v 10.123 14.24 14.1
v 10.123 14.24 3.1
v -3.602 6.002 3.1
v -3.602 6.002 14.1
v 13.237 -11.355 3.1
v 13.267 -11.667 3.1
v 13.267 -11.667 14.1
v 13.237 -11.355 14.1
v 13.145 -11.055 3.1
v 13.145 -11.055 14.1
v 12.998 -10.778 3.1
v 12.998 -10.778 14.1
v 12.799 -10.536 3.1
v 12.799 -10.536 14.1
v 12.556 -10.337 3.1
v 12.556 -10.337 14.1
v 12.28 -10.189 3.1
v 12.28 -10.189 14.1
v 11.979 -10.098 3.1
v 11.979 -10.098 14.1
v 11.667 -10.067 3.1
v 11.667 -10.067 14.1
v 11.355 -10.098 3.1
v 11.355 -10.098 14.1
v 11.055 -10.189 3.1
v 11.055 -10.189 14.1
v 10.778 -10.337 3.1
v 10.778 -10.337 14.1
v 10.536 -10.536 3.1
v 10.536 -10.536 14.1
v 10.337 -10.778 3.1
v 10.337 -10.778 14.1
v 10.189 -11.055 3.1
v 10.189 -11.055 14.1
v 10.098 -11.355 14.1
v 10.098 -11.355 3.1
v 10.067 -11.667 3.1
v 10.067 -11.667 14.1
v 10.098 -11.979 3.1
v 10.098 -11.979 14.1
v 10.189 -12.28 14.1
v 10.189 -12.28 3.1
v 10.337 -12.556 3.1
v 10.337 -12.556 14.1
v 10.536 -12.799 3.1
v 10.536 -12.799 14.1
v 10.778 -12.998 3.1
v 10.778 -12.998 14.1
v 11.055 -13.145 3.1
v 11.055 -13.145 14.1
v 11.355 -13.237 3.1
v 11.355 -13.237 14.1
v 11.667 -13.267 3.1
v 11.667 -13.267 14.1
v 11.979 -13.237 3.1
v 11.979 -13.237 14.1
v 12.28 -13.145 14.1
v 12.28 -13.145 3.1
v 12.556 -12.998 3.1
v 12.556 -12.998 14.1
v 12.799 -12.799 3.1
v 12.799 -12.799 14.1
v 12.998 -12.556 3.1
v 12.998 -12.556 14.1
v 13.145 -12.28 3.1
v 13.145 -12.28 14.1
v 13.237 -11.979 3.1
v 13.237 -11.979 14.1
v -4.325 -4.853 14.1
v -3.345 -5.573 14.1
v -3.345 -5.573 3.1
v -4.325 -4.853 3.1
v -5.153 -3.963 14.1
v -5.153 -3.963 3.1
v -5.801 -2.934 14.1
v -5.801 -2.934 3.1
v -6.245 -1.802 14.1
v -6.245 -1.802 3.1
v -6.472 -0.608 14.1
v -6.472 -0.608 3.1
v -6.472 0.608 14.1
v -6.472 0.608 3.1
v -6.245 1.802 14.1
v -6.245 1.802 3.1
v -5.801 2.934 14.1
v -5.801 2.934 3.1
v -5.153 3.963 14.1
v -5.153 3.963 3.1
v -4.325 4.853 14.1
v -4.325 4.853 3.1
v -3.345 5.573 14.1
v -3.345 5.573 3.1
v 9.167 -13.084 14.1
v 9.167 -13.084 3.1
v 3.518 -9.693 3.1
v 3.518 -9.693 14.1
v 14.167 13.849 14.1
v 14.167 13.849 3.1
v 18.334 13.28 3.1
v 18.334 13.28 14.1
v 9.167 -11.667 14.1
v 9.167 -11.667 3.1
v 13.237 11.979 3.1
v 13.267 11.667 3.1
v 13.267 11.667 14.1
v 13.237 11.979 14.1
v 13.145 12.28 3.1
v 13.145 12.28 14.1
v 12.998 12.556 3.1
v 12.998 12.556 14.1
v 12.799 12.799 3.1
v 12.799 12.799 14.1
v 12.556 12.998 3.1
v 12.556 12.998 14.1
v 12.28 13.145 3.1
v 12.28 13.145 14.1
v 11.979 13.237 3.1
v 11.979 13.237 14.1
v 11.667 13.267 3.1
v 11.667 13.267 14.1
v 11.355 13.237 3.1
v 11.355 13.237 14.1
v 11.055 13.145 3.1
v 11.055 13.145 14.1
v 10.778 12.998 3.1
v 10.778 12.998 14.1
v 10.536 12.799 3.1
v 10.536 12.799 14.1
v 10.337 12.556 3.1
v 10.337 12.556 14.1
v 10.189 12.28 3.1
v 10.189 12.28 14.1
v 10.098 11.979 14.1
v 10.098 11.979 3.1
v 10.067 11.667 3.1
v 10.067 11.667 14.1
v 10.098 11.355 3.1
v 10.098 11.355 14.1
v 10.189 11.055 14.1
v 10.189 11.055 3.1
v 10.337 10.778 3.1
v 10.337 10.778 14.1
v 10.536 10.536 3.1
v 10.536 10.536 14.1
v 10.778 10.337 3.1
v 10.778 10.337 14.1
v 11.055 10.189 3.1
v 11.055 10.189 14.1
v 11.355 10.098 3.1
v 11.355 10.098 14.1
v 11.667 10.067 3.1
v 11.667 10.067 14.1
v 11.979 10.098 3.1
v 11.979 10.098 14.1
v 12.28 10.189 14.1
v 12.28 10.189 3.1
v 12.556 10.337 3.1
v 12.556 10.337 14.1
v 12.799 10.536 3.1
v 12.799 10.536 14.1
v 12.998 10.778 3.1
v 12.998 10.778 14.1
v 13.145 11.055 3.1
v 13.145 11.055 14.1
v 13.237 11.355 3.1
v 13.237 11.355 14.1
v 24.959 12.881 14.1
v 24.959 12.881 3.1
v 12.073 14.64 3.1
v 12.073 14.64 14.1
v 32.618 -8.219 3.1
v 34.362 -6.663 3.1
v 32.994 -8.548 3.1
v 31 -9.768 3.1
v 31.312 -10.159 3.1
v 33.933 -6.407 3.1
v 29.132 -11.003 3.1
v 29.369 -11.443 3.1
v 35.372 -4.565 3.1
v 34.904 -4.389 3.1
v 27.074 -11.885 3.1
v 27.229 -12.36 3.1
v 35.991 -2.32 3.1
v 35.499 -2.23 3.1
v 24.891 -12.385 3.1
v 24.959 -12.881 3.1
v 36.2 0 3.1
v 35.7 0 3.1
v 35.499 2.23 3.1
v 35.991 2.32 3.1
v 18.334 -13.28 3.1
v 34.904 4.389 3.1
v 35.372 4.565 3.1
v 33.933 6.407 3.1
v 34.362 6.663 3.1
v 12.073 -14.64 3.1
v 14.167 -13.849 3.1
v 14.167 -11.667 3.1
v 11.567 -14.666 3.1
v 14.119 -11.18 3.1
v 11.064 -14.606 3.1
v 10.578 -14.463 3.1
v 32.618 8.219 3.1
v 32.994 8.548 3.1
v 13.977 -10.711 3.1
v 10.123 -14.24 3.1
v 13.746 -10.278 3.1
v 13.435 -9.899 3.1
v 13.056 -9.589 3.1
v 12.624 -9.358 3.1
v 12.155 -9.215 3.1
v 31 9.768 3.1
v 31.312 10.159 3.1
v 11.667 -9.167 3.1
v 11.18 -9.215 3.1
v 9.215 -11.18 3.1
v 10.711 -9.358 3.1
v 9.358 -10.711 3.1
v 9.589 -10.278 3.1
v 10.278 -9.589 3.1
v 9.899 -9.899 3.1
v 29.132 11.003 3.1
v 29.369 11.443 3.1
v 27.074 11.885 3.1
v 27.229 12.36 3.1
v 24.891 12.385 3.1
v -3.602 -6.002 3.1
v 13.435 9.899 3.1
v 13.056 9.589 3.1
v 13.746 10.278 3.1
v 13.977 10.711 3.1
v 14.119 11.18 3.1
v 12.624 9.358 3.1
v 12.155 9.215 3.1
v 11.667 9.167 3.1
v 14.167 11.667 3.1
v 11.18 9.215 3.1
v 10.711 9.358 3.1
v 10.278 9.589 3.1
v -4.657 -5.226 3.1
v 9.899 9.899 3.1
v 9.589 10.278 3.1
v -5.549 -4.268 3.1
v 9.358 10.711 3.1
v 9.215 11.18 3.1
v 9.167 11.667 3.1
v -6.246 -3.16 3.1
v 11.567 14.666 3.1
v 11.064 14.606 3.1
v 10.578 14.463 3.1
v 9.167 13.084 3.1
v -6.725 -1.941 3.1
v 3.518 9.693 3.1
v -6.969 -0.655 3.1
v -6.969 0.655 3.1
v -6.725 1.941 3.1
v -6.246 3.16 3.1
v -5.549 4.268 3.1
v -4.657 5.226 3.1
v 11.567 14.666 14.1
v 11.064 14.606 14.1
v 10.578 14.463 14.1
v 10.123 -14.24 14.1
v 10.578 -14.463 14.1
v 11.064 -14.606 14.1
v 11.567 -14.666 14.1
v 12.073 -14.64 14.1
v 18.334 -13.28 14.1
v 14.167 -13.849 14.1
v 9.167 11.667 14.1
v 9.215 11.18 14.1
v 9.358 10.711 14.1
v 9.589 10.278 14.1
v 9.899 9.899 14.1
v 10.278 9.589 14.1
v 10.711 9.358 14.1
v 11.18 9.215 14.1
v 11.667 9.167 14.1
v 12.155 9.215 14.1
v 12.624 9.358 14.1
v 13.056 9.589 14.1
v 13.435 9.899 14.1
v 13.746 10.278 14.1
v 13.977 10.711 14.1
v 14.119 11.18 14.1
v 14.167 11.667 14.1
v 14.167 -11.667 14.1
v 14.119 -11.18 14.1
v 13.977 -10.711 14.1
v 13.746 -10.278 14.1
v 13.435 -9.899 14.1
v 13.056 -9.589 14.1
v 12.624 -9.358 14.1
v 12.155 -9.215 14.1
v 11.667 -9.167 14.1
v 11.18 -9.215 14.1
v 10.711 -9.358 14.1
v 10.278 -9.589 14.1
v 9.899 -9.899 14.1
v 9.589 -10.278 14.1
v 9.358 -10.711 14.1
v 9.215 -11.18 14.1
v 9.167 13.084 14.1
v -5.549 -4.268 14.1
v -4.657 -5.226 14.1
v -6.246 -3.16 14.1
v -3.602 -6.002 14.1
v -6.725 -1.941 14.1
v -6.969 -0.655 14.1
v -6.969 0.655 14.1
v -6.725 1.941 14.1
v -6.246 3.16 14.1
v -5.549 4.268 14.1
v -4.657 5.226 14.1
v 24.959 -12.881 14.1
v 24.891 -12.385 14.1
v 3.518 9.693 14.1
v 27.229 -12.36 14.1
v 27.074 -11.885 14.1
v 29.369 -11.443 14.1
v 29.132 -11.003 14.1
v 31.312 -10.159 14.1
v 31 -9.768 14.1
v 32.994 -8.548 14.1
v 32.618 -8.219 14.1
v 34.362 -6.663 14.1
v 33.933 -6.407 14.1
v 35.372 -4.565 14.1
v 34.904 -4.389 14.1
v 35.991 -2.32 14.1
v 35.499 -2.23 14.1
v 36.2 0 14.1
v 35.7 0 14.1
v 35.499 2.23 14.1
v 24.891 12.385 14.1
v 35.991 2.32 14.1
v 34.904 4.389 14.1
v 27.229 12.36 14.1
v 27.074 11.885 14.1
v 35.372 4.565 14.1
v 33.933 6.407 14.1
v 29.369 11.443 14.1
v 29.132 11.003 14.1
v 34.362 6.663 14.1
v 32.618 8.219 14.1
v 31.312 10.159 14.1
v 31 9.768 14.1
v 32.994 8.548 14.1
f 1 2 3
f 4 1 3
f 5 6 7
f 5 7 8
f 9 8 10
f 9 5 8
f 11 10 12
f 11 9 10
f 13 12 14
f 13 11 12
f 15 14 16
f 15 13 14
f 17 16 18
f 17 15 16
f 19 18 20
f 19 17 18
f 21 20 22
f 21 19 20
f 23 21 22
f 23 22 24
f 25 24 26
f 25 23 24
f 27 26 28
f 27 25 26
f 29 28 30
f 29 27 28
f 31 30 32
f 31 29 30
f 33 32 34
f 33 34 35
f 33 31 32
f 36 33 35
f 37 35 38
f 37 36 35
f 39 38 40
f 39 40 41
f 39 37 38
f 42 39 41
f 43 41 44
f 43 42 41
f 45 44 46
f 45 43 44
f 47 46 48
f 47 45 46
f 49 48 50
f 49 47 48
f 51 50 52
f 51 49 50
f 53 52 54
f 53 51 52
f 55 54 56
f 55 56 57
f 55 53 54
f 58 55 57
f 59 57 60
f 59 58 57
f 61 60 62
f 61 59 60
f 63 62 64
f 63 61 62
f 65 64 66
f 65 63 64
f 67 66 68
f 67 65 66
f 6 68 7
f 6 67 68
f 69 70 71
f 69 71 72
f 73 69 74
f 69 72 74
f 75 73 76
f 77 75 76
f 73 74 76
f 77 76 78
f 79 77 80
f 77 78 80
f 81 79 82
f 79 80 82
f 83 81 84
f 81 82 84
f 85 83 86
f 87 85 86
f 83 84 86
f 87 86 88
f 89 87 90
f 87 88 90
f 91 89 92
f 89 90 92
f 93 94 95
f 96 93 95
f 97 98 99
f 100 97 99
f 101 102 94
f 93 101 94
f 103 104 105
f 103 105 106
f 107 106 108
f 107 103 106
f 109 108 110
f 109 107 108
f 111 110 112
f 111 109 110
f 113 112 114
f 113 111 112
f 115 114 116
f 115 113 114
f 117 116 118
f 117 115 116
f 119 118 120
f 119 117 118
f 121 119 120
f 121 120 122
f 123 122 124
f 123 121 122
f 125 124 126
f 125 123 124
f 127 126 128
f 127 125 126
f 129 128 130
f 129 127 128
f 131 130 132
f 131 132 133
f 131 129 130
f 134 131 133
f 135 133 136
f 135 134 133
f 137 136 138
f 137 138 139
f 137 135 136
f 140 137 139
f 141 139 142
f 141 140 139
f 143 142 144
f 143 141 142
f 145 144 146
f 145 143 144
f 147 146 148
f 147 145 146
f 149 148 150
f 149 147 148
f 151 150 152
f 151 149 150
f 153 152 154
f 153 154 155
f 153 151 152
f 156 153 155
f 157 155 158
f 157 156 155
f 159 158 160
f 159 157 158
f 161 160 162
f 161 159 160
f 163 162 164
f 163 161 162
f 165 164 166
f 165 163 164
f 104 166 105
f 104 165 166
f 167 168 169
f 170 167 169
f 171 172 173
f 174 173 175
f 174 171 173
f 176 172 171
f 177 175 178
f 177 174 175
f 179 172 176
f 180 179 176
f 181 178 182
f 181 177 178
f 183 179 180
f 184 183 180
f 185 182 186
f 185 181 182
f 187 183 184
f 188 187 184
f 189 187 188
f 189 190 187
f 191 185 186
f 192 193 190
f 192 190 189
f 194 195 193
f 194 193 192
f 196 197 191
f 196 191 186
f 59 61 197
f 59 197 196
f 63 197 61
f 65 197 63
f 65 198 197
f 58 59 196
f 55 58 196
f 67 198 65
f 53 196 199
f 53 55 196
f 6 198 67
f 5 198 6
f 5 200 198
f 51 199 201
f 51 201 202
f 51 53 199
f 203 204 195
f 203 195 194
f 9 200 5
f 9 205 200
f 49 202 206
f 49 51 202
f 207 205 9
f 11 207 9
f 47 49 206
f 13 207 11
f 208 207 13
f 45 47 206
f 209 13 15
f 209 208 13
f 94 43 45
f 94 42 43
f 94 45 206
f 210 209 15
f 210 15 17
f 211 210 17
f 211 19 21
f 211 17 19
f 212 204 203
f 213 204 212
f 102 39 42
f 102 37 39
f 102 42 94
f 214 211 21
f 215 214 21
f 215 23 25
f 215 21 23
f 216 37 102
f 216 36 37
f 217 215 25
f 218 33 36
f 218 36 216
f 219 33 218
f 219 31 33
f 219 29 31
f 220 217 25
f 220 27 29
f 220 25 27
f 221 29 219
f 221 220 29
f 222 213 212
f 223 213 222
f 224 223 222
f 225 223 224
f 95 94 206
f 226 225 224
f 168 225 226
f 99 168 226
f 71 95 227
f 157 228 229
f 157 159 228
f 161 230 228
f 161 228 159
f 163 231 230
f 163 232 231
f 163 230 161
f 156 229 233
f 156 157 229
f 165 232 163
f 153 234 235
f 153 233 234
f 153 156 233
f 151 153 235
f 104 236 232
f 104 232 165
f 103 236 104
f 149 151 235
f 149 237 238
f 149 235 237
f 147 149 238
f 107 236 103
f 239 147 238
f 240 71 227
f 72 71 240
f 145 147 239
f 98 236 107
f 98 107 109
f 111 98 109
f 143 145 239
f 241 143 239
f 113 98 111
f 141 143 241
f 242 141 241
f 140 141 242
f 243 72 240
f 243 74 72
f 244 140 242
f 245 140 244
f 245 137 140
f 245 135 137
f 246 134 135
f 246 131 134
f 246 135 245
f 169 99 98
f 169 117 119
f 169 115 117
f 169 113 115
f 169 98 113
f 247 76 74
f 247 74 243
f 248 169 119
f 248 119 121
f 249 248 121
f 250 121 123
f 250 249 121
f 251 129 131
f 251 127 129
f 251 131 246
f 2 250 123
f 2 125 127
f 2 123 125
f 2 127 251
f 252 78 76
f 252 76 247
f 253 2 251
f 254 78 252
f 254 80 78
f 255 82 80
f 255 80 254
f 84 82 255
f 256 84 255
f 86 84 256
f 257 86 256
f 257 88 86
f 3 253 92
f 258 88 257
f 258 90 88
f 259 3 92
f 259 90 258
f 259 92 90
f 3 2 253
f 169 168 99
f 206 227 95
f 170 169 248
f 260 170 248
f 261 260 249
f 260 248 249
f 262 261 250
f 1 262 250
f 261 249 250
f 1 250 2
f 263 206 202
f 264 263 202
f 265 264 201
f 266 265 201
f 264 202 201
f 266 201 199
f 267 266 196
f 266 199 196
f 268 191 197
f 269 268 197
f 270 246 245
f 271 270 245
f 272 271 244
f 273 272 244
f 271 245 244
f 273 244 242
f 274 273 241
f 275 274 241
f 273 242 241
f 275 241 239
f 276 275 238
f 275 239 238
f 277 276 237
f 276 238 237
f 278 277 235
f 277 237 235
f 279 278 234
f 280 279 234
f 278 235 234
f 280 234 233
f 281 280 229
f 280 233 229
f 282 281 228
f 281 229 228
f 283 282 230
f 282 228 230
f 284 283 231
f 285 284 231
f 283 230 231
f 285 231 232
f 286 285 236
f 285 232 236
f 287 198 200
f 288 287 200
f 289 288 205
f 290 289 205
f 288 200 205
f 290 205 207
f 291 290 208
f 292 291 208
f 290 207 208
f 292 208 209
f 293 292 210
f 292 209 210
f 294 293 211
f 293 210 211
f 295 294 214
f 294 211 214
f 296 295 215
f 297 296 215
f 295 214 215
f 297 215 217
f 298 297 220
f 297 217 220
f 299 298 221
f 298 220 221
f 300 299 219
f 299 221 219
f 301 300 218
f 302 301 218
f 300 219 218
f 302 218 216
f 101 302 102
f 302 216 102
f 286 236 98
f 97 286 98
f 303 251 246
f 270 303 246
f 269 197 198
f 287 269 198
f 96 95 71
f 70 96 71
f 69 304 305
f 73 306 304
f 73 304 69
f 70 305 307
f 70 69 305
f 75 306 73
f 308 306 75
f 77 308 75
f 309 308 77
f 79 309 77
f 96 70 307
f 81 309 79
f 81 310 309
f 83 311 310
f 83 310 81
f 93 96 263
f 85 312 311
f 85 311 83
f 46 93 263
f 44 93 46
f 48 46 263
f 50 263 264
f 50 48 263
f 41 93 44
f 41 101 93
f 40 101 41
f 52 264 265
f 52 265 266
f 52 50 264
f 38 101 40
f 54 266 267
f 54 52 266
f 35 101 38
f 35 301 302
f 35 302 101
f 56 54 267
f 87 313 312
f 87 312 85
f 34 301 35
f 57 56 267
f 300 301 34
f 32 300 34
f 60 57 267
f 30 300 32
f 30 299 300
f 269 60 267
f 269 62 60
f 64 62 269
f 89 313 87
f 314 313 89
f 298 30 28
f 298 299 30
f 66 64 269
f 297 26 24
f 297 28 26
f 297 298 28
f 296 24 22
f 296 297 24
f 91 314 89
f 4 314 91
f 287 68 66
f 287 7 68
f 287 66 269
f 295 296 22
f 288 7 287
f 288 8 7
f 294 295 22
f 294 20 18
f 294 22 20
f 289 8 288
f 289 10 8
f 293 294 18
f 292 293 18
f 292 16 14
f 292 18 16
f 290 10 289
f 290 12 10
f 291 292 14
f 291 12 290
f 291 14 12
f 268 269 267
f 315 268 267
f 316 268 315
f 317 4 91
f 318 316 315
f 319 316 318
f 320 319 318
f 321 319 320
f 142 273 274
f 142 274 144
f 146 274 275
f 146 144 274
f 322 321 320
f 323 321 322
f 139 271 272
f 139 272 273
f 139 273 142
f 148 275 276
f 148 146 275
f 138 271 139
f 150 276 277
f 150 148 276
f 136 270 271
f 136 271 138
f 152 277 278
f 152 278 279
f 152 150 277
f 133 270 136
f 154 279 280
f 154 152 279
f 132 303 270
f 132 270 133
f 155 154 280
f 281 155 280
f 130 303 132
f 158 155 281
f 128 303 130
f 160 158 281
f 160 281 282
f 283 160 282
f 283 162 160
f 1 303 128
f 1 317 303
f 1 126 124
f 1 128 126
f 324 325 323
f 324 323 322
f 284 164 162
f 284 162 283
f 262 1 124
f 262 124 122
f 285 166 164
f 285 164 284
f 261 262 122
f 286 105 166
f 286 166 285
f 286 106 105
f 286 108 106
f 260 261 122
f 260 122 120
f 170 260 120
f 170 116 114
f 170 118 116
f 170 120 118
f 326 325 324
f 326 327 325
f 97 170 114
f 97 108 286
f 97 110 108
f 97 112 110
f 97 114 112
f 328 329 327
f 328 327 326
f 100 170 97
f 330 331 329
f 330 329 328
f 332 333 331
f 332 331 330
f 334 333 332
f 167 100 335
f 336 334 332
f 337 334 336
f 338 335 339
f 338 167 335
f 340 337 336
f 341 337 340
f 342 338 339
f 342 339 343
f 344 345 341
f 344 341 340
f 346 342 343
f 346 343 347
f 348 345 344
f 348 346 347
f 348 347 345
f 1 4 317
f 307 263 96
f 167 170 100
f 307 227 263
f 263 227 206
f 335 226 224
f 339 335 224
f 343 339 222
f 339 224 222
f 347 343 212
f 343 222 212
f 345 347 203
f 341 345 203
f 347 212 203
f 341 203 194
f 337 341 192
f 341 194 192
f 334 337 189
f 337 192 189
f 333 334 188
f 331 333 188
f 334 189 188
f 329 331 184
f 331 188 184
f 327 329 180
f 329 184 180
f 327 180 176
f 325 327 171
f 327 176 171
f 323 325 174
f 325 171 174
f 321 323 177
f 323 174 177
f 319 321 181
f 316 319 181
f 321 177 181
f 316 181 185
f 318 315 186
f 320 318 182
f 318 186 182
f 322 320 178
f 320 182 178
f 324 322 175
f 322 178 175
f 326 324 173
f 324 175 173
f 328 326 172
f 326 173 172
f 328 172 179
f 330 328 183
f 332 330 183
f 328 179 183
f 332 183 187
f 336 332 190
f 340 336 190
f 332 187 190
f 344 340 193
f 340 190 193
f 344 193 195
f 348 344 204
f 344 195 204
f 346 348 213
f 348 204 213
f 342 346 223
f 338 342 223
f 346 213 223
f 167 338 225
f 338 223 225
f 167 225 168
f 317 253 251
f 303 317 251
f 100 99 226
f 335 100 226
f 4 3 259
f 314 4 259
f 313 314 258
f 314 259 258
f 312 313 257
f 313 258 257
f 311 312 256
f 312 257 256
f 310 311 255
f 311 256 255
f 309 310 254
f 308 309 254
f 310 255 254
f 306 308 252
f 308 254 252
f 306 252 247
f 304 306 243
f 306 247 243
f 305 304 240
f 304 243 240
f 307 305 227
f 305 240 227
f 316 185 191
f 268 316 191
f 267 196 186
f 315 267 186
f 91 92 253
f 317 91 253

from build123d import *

# Parameters (mm, degrees)
SKETCH1_R           = 3
SKETCH1_R_2         = 4.5
SKETCH1_R_3         = 1.6
BOSS_EXTRUDE3_DEPTH = 1.6
SKETCH2_R           = 1.6
SKETCH2_R_2         = 3
SKETCH2_R_3         = 4.5
BOSS_EXTRUDE4_DEPTH = 1.5
SKETCH3_R           = 63.206562555
CUT_EXTRUDE1_DEPTH  = 1.6
SKETCH4_R           = 3
SKETCH4_R_2         = 1.6
BOSS_EXTRUDE5_DEPTH = 1.5
SKETCH5_R           = 1.6
BOSS_EXTRUDE6_DEPTH = 11
SKETCH6_R           = 49.514430464
CUT_EXTRUDE2_DEPTH  = 1.5


with BuildPart() as part:
    # Sketch1 → Boss-Extrude3 (new body)
    with BuildSketch(Plane.XY):
        with BuildLine():
            Line((12.073070054, 14.639688463), (24.958502044, 12.880515151))
            ThreePointArc((24.958502044, 12.880515151), (36.2, 0), (24.958502044, -12.880515151))
            Line((24.958502044, -12.880515151), (12.073070054, -14.639688463))
            ThreePointArc((12.073070054, -14.639688463), (11.870633815, -14.660360595), (11.66726189, -14.66726189))
            Line((11.66726189, -14.66726189), (0, -14.66726189))
            ThreePointArc((0, -14.66726189), (-0.888679088, -14.53261518), (-1.697586366, -14.140761542))
            Line((-1.697586366, -14.140761542), (-18.697586366, -2.473499652))
            ThreePointArc((-18.697586366, -2.473499652), (-19.891071988, -0.801063519), (-19.728500117, 1.247111507))
            Line((-19.728500117, 1.247111507), (-14.395762007, 12.914373397))
            ThreePointArc((-14.395762007, 12.914373397), (-13.288783625, 14.191279968), (-11.66726189, 14.66726189))
            Line((-11.66726189, 14.66726189), (11.66726189, 14.66726189))
            ThreePointArc((11.66726189, 14.66726189), (11.870633815, 14.660360595), (12.073070054, 14.639688463))
        make_face()
        Circle(SKETCH1_R, mode=Mode.SUBTRACT)
        with Locations((23.2, 0)):
            Circle(SKETCH1_R_2, mode=Mode.SUBTRACT)
        with Locations((8.6, 0)):
            Circle(SKETCH1_R, mode=Mode.SUBTRACT)
        with Locations((-17, 0)):
            Circle(SKETCH1_R_3, mode=Mode.SUBTRACT)
        with Locations((0, -11.66726189)):
            Circle(SKETCH1_R_3, mode=Mode.SUBTRACT)
        with Locations((11.66726189, -11.66726189)):
            Circle(SKETCH1_R_3, mode=Mode.SUBTRACT)
        with Locations((-11.66726189, 11.66726189)):
            Circle(SKETCH1_R_3, mode=Mode.SUBTRACT)
        with Locations((0, 11.66726189)):
            Circle(SKETCH1_R_3, mode=Mode.SUBTRACT)
        with Locations((11.66726189, 11.66726189)):
            Circle(SKETCH1_R_3, mode=Mode.SUBTRACT)
    extrude(amount=BOSS_EXTRUDE3_DEPTH)

    # Sketch2 → Boss-Extrude4 (add)
    with BuildSketch(Plane.XY.offset(1.6)):
        with BuildLine():
            Line((12.073070054, 14.639688463), (24.958502044, 12.880515151))
            ThreePointArc((24.958502044, 12.880515151), (36.2, 0), (24.958502044, -12.880515151))
            Line((24.958502044, -12.880515151), (12.073070054, -14.639688463))
            ThreePointArc((12.073070054, -14.639688463), (10.884137398, -14.56324463), (9.81871257, -14.030070687))
            Line((9.81871257, -14.030070687), (-3.080915533, -3.938014662))
            ThreePointArc((-3.080915533, -3.938014662), (-5, 0), (-3.080915533, 3.938014662))
            Line((-3.080915533, 3.938014662), (9.81871257, 14.030070687))
            ThreePointArc((9.81871257, 14.030070687), (10.884137398, 14.56324463), (12.073070054, 14.639688463))
        make_face()
        with Locations((11.66726189, 11.66726189)):
            Circle(SKETCH2_R, mode=Mode.SUBTRACT)
        Circle(SKETCH2_R_2, mode=Mode.SUBTRACT)
        with Locations((8.6, 0)):
            Circle(SKETCH2_R_2, mode=Mode.SUBTRACT)
        with Locations((23.2, 0)):
            Circle(SKETCH2_R_3, mode=Mode.SUBTRACT)
        with Locations((11.66726189, -11.66726189)):
            Circle(SKETCH2_R, mode=Mode.SUBTRACT)
    extrude(amount=BOSS_EXTRUDE4_DEPTH)

    # Sketch3 → Cut-Extrude1 (cut)
    with BuildSketch(Plane(origin=(0, 0, 0), x_dir=(-1, 0, 0), z_dir=(0, 0, -1))):
        Circle(SKETCH3_R)
    extrude(amount=-CUT_EXTRUDE1_DEPTH, mode=Mode.SUBTRACT)

    # Sketch4 → Boss-Extrude5 (add)
    with BuildSketch(Plane.XY.offset(3.1)):
        with BuildLine():
            Line((-3.602159399, 6.00203696), (10.12347929, 14.239563444))
            ThreePointArc((10.12347929, 14.239563444), (13.145208472, 14.277946455), (14.66726189, 11.66726189))
            Line((14.66726189, 11.66726189), (14.66726189, -11.66726189))
            ThreePointArc((14.66726189, -11.66726189), (13.145208472, -14.277946455), (10.12347929, -14.239563444))
            Line((10.12347929, -14.239563444), (-3.602159399, -6.00203696))
            ThreePointArc((-3.602159399, -6.00203696), (-7, 0), (-3.602159399, 6.00203696))
        make_face()
        Circle(SKETCH4_R, mode=Mode.SUBTRACT)
        with Locations((8.6, 0)):
            Circle(SKETCH4_R, mode=Mode.SUBTRACT)
        with Locations((11.66726189, 11.66726189)):
            Circle(SKETCH4_R_2, mode=Mode.SUBTRACT)
        with Locations((11.66726189, -11.66726189)):
            Circle(SKETCH4_R_2, mode=Mode.SUBTRACT)
    extrude(amount=-BOSS_EXTRUDE5_DEPTH)

    # Sketch5 → Boss-Extrude6 (add)
    with BuildSketch(Plane.XY.offset(3.1)):
        with BuildLine():
            Line((10.12347929, 14.239563444), (-3.602159399, 6.00203696))
            ThreePointArc((-3.602159399, 6.00203696), (-7, 0), (-3.602159399, -6.00203696))
            Line((-3.602159399, -6.00203696), (10.12347929, -14.239563444))
            ThreePointArc((10.12347929, -14.239563444), (11.064127193, -14.606007972), (12.073070054, -14.639688463))
            Line((12.073070054, -14.639688463), (24.958502044, -12.880515151))
            ThreePointArc((24.958502044, -12.880515151), (36.2, 0), (24.958502044, 12.880515151))
            Line((24.958502044, 12.880515151), (12.073070054, 14.639688463))
            ThreePointArc((12.073070054, 14.639688463), (11.064127193, 14.606007972), (10.12347929, 14.239563444))
        make_face()
        with Locations((11.66726189, -11.66726189)):
            Circle(SKETCH5_R, mode=Mode.SUBTRACT)
        with BuildLine():
            Line((-3.345341009, 5.573371264), (3.517564288, 9.692737701))
            Line((3.517564288, 9.692737701), (9.16726189, 13.083892566))
            Line((9.16726189, 13.083892566), (9.16726189, 11.66726189))
            ThreePointArc((9.16726189, 11.66726189), (11.66726189, 9.16726189), (14.16726189, 11.66726189))
            Line((14.16726189, 11.66726189), (14.16726189, 13.849142394))
            Line((14.16726189, 13.849142394), (18.333589211, 13.280337883))
            Line((18.333589211, 13.280337883), (24.89086735, 12.385110722))
            ThreePointArc((24.89086735, 12.385110722), (35.7, 0), (24.89086735, -12.385110722))
            Line((24.89086735, -12.385110722), (18.333589211, -13.280337883))
            Line((18.333589211, -13.280337883), (14.16726189, -13.849142394))
            Line((14.16726189, -13.849142394), (14.16726189, -11.66726189))
            ThreePointArc((14.16726189, -11.66726189), (11.66726189, -9.16726189), (9.16726189, -11.66726189))
            Line((9.16726189, -11.66726189), (9.16726189, -13.083892566))
            Line((9.16726189, -13.083892566), (3.517564288, -9.692737701))
            Line((3.517564288, -9.692737701), (-3.345341009, -5.573371264))
            ThreePointArc((-3.345341009, -5.573371264), (-6.500290279, 0), (-3.345341009, 5.573371264))
        make_face(mode=Mode.SUBTRACT)
        with Locations((11.66726189, 11.66726189)):
            Circle(SKETCH5_R, mode=Mode.SUBTRACT)
    extrude(amount=BOSS_EXTRUDE6_DEPTH)

    # Sketch6 → Cut-Extrude2 (cut)
    with BuildSketch(Plane(origin=(0, 0, 1.6), x_dir=(-1, 0, 0), z_dir=(0, 0, -1))):
        Circle(SKETCH6_R)
    extrude(amount=-CUT_EXTRUDE2_DEPTH, mode=Mode.SUBTRACT)


solid = part.part
